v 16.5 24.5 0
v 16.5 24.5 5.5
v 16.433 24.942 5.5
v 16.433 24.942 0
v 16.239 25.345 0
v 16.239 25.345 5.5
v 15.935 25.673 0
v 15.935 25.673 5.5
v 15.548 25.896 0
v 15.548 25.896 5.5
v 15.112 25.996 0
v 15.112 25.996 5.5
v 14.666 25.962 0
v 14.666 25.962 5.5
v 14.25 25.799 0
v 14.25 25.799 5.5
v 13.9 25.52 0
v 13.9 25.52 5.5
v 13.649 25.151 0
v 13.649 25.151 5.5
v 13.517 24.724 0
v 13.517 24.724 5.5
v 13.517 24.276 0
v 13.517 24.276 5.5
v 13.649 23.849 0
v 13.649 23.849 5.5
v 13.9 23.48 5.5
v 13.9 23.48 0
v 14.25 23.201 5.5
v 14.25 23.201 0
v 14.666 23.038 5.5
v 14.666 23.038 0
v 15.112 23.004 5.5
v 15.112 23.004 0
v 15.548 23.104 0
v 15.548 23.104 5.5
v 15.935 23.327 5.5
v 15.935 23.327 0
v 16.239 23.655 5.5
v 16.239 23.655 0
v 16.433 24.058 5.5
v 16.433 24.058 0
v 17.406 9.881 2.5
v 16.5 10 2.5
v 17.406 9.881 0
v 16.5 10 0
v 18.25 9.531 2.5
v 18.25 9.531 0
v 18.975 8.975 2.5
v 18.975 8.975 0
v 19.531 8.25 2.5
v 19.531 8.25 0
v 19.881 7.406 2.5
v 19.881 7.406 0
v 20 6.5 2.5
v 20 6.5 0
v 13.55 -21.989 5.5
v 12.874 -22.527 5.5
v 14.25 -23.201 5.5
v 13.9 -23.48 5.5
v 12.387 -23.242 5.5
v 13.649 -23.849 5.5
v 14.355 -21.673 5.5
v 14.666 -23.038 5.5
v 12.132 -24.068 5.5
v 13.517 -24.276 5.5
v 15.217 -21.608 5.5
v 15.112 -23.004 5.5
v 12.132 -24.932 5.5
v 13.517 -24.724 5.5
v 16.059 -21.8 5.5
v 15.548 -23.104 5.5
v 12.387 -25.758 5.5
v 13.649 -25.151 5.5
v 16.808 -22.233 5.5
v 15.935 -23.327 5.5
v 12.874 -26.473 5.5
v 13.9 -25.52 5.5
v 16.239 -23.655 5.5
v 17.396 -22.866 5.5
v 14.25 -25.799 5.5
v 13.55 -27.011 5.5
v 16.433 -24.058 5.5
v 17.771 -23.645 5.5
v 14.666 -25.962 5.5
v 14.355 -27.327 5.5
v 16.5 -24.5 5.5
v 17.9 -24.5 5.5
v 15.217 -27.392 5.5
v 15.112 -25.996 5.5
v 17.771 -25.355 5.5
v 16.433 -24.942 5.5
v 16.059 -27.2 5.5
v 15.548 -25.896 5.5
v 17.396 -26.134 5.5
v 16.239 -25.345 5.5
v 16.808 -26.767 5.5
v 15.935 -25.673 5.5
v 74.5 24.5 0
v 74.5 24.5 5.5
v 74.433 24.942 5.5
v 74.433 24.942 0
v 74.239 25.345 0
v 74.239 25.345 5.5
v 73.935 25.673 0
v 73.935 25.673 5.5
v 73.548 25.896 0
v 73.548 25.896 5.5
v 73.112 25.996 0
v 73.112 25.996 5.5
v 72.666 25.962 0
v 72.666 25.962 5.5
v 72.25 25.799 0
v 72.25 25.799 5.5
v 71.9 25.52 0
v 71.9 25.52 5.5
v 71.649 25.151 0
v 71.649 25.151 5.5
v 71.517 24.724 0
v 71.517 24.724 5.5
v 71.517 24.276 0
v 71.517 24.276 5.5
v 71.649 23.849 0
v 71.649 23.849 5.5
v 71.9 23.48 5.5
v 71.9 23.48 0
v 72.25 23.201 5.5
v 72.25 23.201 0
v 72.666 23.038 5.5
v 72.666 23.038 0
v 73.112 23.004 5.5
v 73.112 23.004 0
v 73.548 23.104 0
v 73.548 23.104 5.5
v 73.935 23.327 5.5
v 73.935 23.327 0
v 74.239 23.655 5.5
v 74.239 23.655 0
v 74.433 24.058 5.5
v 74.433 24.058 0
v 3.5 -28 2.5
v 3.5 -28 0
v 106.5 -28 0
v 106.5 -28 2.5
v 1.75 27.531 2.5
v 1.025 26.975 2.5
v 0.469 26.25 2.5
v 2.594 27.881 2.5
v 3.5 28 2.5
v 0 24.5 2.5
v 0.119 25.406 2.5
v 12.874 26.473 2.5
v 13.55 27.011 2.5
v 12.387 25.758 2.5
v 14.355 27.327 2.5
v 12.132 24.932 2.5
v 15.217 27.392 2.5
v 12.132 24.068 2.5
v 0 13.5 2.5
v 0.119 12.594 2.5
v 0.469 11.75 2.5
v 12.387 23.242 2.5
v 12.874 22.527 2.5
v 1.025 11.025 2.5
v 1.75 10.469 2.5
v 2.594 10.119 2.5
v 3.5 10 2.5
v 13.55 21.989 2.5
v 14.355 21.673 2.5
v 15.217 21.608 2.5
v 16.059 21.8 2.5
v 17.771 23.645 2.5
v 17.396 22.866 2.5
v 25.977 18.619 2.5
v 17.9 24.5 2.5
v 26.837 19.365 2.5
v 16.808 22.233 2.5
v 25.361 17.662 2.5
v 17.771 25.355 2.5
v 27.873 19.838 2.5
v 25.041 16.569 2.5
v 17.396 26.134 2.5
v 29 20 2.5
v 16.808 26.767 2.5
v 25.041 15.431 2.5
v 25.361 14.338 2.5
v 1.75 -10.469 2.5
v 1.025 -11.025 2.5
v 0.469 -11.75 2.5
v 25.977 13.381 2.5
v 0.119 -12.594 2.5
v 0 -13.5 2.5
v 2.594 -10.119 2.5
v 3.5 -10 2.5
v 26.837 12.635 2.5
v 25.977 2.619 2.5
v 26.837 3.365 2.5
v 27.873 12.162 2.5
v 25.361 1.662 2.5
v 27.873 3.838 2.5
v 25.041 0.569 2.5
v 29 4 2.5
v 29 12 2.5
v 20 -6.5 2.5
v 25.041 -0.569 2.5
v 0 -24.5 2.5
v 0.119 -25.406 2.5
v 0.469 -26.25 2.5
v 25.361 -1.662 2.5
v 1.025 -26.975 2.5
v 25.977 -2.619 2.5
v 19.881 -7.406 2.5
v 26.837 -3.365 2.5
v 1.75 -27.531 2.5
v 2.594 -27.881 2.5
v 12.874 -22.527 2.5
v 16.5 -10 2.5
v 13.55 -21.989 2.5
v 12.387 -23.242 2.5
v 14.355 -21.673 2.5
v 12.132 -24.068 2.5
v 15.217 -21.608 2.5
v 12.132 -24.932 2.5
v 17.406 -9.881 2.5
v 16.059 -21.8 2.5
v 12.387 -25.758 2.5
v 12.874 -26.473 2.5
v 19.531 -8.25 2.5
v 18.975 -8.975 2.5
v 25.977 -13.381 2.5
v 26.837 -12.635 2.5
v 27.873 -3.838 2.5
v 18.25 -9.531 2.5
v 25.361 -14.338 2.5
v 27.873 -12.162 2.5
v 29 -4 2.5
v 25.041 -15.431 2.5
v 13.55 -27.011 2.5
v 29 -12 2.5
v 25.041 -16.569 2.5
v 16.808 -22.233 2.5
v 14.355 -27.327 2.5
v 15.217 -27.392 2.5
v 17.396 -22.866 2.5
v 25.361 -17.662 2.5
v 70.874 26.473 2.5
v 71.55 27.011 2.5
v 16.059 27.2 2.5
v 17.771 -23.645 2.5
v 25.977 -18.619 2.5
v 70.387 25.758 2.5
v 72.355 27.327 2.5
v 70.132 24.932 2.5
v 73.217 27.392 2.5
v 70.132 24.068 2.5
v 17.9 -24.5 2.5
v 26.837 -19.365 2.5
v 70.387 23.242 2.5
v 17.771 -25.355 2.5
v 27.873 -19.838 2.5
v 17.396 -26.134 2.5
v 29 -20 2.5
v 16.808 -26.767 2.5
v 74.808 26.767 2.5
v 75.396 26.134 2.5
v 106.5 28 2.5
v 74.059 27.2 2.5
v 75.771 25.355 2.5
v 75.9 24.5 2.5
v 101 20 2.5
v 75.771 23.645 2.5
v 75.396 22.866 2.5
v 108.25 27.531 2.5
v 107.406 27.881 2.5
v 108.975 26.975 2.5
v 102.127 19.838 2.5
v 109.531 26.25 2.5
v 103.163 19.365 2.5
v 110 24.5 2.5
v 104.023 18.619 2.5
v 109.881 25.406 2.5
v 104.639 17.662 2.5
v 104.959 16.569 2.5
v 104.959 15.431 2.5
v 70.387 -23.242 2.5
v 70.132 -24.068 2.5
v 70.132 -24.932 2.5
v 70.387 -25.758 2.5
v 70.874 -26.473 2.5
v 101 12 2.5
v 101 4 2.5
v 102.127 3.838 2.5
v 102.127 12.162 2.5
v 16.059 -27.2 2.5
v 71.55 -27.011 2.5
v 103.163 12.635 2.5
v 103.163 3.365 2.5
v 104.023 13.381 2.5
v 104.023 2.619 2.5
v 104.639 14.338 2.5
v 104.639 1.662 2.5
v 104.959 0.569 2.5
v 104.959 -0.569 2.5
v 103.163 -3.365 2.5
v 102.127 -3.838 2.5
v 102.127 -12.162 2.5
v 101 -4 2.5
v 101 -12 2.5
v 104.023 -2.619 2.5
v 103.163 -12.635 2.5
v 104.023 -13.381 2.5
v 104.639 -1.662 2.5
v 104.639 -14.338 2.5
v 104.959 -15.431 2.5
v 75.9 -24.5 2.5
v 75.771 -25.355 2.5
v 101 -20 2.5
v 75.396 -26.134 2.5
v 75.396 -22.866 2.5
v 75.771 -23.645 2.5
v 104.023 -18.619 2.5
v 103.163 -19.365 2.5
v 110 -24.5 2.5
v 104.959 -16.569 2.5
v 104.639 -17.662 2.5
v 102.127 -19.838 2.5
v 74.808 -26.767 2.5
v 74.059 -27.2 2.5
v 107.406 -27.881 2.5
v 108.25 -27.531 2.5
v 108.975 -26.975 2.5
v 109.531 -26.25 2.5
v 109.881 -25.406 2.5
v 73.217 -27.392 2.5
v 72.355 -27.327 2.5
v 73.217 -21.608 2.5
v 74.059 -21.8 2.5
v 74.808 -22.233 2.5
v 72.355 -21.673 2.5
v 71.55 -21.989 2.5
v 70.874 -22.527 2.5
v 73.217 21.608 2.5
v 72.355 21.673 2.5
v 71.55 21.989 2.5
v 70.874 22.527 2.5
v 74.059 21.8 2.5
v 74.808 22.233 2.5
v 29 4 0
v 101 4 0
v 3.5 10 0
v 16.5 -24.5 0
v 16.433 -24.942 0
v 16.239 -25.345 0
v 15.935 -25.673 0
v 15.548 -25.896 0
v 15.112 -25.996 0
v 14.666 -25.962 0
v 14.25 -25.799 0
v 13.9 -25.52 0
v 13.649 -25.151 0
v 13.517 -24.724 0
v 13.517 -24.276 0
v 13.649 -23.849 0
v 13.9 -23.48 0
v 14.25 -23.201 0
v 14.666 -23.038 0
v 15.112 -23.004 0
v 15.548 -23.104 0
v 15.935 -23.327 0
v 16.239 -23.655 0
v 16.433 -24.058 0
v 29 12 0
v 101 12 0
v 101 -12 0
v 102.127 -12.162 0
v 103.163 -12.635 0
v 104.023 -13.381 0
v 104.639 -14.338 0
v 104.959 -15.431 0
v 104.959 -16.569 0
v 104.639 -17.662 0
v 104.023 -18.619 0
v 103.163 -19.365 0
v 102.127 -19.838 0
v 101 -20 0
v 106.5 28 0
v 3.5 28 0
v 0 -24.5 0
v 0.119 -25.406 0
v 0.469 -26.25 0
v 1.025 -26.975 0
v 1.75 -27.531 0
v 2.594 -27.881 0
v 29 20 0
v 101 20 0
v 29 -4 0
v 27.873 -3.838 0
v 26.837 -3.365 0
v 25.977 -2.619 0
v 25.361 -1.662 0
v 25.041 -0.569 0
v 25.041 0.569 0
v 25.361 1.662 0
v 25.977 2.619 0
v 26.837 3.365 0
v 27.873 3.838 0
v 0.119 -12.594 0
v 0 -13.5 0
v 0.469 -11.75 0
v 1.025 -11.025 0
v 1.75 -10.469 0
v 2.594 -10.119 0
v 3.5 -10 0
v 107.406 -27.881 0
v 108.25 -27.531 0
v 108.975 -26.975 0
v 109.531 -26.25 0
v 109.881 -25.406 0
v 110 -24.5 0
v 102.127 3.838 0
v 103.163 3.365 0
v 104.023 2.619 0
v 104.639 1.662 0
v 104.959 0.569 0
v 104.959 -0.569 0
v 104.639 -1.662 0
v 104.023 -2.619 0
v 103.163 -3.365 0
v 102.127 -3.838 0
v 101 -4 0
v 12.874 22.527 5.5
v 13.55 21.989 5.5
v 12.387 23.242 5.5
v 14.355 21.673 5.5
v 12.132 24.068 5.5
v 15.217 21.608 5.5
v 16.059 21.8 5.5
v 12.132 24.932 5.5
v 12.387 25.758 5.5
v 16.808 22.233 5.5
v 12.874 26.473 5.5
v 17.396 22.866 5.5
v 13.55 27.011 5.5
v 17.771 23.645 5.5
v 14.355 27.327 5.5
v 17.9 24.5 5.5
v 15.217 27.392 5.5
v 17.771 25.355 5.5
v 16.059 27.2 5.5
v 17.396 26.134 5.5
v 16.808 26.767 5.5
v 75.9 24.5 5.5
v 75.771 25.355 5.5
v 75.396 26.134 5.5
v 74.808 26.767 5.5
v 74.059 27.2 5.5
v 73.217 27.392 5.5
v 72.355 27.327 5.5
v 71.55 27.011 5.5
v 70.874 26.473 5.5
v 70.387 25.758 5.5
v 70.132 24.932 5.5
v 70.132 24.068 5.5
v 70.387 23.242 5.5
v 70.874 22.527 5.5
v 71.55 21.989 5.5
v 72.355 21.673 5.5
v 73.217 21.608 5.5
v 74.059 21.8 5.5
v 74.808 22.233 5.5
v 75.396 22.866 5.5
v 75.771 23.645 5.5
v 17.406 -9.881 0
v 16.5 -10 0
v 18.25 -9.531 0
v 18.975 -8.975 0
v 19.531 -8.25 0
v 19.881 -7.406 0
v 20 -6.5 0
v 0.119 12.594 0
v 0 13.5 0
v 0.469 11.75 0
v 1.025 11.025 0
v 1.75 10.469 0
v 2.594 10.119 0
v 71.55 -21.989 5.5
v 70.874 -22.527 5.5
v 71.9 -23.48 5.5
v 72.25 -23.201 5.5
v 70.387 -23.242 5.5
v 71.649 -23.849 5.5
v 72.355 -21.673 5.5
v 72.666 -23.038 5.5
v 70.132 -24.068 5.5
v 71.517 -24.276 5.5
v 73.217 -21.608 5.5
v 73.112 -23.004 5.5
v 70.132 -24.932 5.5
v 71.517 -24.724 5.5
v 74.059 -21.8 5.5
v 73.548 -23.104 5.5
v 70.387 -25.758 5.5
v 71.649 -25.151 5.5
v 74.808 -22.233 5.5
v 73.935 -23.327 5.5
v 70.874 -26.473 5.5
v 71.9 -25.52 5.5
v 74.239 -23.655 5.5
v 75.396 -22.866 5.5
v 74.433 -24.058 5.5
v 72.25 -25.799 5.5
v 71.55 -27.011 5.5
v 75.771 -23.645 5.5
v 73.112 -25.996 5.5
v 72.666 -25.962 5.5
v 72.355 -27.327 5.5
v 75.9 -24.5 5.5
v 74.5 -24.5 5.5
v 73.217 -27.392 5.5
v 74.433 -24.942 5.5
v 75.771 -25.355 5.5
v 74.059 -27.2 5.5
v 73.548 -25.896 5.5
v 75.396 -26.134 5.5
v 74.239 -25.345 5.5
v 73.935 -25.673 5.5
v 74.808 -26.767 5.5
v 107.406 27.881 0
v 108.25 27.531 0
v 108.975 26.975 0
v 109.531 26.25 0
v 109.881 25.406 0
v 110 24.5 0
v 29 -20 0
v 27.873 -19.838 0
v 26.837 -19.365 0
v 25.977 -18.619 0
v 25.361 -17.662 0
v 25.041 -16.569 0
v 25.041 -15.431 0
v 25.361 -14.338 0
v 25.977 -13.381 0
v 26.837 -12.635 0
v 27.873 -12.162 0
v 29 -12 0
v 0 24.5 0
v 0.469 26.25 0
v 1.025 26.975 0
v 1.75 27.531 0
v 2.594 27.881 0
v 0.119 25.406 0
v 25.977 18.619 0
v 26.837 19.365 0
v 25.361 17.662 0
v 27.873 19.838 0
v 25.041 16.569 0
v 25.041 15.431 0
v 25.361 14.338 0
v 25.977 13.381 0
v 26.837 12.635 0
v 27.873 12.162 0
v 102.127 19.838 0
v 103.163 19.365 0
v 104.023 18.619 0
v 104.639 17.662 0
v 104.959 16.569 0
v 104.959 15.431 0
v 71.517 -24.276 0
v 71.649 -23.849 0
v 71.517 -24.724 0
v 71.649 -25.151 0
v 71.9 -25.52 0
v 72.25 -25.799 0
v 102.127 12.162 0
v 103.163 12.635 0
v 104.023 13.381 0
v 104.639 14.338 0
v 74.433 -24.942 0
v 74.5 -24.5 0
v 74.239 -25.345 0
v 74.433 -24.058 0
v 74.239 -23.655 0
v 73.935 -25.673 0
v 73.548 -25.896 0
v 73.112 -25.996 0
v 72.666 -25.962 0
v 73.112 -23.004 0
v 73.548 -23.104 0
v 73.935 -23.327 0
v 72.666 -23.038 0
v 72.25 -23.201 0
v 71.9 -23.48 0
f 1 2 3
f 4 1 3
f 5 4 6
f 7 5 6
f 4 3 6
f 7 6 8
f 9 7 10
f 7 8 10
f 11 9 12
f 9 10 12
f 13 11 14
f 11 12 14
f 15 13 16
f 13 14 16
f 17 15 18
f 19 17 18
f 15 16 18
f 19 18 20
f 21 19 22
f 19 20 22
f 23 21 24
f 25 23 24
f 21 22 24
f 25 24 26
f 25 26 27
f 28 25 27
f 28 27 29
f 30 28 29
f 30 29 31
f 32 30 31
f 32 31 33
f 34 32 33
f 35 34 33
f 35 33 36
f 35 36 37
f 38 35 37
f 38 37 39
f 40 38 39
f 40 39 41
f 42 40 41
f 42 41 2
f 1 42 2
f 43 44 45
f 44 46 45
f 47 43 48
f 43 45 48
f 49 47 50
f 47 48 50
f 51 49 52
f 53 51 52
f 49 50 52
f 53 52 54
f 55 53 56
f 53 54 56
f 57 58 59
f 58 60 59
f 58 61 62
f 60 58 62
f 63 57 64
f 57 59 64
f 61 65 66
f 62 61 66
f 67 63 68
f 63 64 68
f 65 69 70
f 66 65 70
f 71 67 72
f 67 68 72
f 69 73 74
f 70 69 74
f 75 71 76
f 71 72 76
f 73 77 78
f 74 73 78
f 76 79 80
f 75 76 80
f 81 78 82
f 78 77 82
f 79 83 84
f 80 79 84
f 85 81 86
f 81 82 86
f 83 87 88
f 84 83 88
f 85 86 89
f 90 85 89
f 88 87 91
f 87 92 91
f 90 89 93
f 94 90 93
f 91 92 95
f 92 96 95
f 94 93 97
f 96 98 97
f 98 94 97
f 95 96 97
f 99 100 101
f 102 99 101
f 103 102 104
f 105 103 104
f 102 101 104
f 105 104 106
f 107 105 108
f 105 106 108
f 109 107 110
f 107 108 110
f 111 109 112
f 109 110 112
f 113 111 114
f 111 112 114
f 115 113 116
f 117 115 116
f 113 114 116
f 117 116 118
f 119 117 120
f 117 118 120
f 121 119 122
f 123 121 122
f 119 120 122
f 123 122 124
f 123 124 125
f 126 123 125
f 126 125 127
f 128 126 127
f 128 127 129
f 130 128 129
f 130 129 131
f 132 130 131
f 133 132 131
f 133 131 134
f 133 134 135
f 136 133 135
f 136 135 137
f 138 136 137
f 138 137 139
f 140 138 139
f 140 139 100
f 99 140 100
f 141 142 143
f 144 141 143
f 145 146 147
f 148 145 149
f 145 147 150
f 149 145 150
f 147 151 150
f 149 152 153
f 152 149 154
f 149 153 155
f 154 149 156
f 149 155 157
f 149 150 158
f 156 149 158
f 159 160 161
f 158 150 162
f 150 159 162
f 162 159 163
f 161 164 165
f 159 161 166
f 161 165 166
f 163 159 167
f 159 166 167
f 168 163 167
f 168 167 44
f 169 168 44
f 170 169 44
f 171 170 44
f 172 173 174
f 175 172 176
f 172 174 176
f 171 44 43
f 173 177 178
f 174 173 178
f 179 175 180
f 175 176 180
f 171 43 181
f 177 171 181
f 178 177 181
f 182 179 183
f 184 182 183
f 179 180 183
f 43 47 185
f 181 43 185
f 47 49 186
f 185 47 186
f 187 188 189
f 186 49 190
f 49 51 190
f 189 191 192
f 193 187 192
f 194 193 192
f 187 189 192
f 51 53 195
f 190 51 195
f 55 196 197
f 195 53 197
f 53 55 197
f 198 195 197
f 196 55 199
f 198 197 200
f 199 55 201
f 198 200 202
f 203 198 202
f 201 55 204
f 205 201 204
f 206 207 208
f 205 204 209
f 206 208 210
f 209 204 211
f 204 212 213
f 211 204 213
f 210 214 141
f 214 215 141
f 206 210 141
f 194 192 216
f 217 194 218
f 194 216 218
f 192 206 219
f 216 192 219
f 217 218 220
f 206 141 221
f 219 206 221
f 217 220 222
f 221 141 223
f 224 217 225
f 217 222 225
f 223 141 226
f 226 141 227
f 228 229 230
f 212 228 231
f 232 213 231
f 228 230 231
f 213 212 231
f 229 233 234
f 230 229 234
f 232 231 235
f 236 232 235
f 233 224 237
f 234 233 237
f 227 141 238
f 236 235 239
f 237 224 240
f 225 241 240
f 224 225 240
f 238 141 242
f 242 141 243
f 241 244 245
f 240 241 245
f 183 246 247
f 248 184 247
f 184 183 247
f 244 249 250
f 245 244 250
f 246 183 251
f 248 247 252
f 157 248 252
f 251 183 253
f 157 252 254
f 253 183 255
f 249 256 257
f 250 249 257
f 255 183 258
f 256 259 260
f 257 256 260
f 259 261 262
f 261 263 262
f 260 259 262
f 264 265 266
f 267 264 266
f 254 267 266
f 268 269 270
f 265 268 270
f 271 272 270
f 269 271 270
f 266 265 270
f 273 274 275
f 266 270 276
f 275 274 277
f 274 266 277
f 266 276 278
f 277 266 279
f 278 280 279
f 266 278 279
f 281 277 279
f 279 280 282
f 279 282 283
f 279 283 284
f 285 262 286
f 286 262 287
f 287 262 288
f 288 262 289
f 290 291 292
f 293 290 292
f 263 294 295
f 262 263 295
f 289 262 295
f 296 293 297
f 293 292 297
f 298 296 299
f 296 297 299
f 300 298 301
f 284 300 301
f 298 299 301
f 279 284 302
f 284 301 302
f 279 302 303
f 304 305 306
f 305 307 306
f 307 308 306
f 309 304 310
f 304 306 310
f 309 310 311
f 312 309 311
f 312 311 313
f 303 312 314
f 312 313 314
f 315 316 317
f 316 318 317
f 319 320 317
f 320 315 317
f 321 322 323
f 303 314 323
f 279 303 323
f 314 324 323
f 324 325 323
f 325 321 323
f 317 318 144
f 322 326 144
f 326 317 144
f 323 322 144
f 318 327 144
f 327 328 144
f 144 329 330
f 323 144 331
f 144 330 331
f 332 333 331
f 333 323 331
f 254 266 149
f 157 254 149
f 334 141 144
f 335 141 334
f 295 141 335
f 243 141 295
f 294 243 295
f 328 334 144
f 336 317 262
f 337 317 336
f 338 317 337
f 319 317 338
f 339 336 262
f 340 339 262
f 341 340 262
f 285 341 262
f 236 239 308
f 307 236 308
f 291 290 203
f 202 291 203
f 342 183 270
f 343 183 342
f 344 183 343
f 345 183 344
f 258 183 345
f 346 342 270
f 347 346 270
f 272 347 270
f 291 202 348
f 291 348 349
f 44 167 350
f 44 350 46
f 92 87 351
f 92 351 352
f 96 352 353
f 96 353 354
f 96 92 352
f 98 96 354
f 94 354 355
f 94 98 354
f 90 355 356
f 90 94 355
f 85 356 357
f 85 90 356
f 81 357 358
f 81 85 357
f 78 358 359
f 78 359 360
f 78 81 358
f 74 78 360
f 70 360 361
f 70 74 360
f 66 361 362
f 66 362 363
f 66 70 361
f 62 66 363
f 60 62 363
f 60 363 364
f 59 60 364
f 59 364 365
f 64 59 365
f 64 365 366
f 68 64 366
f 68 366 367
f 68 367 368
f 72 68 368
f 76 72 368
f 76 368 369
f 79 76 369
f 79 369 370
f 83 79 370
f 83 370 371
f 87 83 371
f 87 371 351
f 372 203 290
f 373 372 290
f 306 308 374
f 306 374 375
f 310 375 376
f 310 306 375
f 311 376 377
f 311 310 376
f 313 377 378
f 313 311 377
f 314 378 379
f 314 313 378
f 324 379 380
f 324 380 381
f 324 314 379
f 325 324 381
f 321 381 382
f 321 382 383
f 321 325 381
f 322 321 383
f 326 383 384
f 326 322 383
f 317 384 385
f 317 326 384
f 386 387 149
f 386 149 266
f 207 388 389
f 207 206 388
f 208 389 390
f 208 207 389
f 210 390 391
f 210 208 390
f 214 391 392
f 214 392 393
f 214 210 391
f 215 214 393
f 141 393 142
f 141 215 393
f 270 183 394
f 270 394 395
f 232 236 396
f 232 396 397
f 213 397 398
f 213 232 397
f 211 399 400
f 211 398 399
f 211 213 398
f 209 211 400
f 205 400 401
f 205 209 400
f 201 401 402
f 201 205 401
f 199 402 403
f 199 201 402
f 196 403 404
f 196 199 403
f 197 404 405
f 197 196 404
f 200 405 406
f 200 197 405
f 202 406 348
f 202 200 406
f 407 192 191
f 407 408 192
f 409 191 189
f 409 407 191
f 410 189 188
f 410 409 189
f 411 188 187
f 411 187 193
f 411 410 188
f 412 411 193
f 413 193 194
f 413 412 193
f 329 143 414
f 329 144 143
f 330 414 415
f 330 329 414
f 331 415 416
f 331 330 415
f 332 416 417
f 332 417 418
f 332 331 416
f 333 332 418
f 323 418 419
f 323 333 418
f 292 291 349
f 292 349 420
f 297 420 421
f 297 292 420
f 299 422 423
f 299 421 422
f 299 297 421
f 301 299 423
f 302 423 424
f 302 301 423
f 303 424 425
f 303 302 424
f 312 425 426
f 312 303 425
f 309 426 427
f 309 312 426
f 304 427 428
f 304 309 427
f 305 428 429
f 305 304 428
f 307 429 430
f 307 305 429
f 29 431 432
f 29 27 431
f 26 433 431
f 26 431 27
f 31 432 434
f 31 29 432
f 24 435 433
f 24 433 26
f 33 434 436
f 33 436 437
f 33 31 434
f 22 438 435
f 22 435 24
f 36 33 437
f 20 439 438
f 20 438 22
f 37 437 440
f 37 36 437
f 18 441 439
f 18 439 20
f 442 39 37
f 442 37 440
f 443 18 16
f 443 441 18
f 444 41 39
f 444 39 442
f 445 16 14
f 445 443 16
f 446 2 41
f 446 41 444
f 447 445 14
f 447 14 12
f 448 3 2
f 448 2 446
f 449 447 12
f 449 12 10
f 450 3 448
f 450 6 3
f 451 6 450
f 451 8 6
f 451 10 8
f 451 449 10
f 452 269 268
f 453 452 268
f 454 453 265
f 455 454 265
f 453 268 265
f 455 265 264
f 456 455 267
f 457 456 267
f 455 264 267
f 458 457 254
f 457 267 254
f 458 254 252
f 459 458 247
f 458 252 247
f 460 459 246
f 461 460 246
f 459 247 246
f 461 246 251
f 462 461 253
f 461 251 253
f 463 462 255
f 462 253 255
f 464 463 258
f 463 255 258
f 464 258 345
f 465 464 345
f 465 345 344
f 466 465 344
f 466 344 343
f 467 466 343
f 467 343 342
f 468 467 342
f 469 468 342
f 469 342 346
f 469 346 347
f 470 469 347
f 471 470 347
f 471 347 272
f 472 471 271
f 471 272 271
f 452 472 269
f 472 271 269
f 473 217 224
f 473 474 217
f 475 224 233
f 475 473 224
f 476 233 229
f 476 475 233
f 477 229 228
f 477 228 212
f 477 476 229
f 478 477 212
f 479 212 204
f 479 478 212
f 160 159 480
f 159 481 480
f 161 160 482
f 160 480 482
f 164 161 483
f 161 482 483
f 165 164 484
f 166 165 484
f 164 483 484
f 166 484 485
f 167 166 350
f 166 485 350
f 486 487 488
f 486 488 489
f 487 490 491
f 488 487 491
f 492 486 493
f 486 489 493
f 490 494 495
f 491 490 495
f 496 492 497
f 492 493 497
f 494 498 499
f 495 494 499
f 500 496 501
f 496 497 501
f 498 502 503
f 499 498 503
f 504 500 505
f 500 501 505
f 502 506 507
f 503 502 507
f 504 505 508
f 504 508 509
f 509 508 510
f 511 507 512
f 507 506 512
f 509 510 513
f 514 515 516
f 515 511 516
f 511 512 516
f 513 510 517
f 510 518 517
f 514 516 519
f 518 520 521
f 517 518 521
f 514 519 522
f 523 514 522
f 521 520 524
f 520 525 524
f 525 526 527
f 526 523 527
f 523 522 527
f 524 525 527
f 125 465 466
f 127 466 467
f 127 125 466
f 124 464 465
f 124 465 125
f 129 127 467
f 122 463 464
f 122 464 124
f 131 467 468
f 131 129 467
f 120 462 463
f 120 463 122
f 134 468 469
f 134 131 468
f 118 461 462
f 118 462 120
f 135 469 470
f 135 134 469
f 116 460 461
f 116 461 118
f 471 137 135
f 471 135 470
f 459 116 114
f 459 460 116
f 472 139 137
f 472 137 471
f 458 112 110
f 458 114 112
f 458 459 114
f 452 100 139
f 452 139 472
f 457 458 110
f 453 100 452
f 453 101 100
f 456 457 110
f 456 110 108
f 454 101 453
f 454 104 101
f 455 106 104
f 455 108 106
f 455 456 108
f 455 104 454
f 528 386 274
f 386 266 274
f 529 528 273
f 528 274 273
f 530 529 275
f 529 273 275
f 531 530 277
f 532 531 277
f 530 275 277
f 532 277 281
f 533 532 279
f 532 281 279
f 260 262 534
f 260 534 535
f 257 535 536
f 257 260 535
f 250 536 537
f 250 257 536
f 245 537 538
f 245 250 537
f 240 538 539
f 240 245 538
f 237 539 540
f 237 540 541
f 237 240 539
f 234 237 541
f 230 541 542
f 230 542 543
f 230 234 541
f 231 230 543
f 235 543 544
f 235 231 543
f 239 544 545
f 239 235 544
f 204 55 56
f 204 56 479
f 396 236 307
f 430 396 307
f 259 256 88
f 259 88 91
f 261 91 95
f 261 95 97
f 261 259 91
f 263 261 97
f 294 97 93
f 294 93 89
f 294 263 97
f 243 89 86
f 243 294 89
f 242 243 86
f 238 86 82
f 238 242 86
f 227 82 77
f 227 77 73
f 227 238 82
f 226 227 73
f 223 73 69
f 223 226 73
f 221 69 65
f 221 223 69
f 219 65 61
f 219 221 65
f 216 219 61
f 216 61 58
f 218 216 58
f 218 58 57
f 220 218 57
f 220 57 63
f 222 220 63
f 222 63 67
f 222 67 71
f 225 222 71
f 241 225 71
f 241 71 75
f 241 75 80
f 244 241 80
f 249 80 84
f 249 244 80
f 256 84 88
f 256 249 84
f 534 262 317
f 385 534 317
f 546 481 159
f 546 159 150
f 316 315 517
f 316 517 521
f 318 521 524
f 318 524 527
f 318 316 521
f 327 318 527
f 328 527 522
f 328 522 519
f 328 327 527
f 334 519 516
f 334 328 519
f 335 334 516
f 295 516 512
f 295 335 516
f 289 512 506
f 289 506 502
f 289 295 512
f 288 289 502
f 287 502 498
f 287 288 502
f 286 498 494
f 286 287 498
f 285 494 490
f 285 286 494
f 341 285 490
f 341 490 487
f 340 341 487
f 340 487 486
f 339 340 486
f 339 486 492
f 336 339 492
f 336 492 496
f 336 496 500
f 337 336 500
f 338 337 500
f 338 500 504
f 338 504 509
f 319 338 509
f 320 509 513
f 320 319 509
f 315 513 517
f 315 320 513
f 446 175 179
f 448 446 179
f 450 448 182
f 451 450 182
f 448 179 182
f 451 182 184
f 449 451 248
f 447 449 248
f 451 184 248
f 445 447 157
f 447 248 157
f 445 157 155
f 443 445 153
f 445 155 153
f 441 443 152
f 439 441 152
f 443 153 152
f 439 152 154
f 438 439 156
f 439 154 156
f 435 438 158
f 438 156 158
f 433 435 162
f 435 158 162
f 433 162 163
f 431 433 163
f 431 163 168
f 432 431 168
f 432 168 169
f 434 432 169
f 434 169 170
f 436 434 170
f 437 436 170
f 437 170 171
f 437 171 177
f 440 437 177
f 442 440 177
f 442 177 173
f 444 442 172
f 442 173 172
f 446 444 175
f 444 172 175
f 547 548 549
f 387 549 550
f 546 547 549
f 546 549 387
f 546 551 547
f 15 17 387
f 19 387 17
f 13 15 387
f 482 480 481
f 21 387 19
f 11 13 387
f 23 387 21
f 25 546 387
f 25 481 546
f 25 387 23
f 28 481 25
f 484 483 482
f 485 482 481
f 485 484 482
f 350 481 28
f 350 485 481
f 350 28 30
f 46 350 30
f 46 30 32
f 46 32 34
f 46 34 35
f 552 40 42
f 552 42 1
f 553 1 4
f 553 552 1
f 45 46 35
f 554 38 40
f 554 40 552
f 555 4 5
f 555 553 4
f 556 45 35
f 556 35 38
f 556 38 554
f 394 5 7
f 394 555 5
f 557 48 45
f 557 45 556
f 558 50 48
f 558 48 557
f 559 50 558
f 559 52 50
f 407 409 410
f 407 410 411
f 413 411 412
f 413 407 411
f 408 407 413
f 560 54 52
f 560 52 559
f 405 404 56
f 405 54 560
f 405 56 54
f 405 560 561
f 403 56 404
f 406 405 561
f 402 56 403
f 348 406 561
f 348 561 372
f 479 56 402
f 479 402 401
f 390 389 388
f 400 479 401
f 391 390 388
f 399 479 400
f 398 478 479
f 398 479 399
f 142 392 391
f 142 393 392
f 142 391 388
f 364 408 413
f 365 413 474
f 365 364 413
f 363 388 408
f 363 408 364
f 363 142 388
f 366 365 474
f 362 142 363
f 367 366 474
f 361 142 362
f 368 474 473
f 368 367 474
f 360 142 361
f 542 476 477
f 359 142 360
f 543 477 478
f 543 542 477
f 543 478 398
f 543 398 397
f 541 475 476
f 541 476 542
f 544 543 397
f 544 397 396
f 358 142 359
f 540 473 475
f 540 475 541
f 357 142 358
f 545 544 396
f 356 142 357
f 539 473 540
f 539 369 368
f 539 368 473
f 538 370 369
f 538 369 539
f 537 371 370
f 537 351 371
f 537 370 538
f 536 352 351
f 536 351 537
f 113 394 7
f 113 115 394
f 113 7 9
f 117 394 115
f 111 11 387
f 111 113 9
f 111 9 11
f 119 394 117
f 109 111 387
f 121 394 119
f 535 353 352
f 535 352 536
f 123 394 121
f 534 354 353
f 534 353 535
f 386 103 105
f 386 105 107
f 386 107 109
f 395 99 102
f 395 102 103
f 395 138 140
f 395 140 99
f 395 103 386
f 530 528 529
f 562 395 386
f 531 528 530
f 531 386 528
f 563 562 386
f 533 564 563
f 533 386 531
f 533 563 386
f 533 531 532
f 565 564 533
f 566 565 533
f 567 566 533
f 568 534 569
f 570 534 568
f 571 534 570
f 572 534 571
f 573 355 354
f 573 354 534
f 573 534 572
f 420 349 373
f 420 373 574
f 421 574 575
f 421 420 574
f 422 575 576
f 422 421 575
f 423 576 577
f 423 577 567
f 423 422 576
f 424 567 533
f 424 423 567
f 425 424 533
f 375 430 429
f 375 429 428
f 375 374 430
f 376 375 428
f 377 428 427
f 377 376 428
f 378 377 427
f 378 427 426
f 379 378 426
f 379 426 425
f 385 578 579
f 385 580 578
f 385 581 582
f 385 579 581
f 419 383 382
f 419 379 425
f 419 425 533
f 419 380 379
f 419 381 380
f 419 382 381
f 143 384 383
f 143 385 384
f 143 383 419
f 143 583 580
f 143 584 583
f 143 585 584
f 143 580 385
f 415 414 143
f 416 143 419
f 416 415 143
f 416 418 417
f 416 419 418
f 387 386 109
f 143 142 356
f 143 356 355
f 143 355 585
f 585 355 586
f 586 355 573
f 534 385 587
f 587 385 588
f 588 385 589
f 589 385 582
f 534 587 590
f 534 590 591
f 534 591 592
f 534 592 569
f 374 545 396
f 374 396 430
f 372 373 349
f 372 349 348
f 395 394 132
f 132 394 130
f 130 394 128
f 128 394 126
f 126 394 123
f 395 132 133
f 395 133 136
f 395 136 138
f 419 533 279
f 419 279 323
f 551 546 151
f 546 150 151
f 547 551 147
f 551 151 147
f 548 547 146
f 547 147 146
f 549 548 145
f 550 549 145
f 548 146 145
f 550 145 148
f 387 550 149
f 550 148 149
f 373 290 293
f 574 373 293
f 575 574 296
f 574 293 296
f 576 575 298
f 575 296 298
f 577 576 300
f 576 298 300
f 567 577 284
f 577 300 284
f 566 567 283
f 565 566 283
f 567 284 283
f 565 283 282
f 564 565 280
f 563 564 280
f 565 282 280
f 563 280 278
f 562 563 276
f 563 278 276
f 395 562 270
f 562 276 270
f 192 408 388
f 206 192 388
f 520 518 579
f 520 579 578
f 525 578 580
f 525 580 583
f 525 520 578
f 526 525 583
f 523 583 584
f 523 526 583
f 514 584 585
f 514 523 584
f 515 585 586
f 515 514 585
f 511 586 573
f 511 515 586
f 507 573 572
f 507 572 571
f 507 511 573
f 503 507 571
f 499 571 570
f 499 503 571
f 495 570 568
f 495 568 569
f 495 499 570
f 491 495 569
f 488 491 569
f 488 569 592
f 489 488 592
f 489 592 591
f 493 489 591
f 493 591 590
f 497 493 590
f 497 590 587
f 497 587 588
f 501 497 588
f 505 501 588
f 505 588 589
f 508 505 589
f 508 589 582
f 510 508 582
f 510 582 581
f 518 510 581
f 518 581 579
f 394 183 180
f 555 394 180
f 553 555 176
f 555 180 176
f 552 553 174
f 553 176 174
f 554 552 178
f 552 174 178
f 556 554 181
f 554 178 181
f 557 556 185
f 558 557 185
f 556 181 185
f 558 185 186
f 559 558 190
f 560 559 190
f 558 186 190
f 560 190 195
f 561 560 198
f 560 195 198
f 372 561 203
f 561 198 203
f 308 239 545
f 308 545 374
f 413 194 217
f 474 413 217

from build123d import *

# Parameters (mm, degrees)
SKETCH_W            = 110
SKETCH_H            = 28
PAD_DEPTH           = 2.5
SKETCH001_R         = 2.9
PAD001_DEPTH        = 3
SKETCH002_R         = 1.5
POCKET_DEPTH        = 5.501
POCKET001_DEPTH     = 2.501
LINEARPATTERN_COUNT = 2
LINEARPATTERN_PITCH = 16
SKETCH004_W         = 20
SKETCH004_H         = 10
POCKET002_DEPTH     = 2.501
FILLET_R            = 3.5


with BuildPart() as part:
    # Sketch → Pad (new body)
    with BuildSketch(Plane.XY):
        with Locations((55, 14)):
            Rectangle(SKETCH_W, SKETCH_H)
    extrude(amount=PAD_DEPTH)

    # Sketch001 (on Face6 of Pad) → Pad001 (join)
    with BuildSketch(Plane.XY.offset(2.5)):
        with Locations((15, 24.5)):
            Circle(SKETCH001_R)
        with Locations((73, 24.5)):
            Circle(SKETCH001_R)
    extrude(amount=PAD001_DEPTH)

    # Sketch002 (on Face9 of Pad001) → Pocket (cut, through all)
    with BuildSketch(Plane.XY.offset(5.5)):
        with Locations((15, 24.5)):
            Circle(SKETCH002_R)
        with Locations((73, 24.5)):
            Circle(SKETCH002_R)
    extrude(amount=-POCKET_DEPTH, mode=Mode.SUBTRACT)

    # Sketch003 (on Face5 of Pocket) → Pocket001 (cut, through all)
    with BuildSketch(Plane.XY.offset(2.5)):
        with BuildLine():
            ThreePointArc((29, 4), (25, 0), (29, -4))
            Line((29, -4), (101, -4))
            ThreePointArc((101, -4), (105, 0), (101, 4))
            Line((29, 4), (101, 4))
        make_face()
    pocket001 = extrude(amount=-POCKET001_DEPTH, mode=Mode.SUBTRACT)

    # LinearPattern: Pocket001 ×2
    with Locations(*[(0, i * LINEARPATTERN_PITCH, 0) for i in range(1, LINEARPATTERN_COUNT)]):
        add(pocket001, mode=Mode.SUBTRACT)

    # Sketch004 (on Face4 of LinearPattern) → Pocket002 (cut, through all)
    with BuildSketch(Plane.XY.offset(2.5)):
        with Locations((10, 5)):
            Rectangle(SKETCH004_W, SKETCH004_H)
    extrude(amount=-POCKET002_DEPTH, mode=Mode.SUBTRACT)

    # Fillet
    fillet_edges = [part.edges().sort_by_distance(p)[0] for p in [
        (20, 10, 1.25),
        (0, 10, 1.25),
        (0, 28, 1.25),
        (110, 28, 1.25),
    ]]
    fillet(fillet_edges, radius=FILLET_R)

    # Mirrored: part across XZ


with BuildPart() as part_1:
    add(part.part)
    add(part.part.mirror(Plane.XZ))


solid = part_1.part
